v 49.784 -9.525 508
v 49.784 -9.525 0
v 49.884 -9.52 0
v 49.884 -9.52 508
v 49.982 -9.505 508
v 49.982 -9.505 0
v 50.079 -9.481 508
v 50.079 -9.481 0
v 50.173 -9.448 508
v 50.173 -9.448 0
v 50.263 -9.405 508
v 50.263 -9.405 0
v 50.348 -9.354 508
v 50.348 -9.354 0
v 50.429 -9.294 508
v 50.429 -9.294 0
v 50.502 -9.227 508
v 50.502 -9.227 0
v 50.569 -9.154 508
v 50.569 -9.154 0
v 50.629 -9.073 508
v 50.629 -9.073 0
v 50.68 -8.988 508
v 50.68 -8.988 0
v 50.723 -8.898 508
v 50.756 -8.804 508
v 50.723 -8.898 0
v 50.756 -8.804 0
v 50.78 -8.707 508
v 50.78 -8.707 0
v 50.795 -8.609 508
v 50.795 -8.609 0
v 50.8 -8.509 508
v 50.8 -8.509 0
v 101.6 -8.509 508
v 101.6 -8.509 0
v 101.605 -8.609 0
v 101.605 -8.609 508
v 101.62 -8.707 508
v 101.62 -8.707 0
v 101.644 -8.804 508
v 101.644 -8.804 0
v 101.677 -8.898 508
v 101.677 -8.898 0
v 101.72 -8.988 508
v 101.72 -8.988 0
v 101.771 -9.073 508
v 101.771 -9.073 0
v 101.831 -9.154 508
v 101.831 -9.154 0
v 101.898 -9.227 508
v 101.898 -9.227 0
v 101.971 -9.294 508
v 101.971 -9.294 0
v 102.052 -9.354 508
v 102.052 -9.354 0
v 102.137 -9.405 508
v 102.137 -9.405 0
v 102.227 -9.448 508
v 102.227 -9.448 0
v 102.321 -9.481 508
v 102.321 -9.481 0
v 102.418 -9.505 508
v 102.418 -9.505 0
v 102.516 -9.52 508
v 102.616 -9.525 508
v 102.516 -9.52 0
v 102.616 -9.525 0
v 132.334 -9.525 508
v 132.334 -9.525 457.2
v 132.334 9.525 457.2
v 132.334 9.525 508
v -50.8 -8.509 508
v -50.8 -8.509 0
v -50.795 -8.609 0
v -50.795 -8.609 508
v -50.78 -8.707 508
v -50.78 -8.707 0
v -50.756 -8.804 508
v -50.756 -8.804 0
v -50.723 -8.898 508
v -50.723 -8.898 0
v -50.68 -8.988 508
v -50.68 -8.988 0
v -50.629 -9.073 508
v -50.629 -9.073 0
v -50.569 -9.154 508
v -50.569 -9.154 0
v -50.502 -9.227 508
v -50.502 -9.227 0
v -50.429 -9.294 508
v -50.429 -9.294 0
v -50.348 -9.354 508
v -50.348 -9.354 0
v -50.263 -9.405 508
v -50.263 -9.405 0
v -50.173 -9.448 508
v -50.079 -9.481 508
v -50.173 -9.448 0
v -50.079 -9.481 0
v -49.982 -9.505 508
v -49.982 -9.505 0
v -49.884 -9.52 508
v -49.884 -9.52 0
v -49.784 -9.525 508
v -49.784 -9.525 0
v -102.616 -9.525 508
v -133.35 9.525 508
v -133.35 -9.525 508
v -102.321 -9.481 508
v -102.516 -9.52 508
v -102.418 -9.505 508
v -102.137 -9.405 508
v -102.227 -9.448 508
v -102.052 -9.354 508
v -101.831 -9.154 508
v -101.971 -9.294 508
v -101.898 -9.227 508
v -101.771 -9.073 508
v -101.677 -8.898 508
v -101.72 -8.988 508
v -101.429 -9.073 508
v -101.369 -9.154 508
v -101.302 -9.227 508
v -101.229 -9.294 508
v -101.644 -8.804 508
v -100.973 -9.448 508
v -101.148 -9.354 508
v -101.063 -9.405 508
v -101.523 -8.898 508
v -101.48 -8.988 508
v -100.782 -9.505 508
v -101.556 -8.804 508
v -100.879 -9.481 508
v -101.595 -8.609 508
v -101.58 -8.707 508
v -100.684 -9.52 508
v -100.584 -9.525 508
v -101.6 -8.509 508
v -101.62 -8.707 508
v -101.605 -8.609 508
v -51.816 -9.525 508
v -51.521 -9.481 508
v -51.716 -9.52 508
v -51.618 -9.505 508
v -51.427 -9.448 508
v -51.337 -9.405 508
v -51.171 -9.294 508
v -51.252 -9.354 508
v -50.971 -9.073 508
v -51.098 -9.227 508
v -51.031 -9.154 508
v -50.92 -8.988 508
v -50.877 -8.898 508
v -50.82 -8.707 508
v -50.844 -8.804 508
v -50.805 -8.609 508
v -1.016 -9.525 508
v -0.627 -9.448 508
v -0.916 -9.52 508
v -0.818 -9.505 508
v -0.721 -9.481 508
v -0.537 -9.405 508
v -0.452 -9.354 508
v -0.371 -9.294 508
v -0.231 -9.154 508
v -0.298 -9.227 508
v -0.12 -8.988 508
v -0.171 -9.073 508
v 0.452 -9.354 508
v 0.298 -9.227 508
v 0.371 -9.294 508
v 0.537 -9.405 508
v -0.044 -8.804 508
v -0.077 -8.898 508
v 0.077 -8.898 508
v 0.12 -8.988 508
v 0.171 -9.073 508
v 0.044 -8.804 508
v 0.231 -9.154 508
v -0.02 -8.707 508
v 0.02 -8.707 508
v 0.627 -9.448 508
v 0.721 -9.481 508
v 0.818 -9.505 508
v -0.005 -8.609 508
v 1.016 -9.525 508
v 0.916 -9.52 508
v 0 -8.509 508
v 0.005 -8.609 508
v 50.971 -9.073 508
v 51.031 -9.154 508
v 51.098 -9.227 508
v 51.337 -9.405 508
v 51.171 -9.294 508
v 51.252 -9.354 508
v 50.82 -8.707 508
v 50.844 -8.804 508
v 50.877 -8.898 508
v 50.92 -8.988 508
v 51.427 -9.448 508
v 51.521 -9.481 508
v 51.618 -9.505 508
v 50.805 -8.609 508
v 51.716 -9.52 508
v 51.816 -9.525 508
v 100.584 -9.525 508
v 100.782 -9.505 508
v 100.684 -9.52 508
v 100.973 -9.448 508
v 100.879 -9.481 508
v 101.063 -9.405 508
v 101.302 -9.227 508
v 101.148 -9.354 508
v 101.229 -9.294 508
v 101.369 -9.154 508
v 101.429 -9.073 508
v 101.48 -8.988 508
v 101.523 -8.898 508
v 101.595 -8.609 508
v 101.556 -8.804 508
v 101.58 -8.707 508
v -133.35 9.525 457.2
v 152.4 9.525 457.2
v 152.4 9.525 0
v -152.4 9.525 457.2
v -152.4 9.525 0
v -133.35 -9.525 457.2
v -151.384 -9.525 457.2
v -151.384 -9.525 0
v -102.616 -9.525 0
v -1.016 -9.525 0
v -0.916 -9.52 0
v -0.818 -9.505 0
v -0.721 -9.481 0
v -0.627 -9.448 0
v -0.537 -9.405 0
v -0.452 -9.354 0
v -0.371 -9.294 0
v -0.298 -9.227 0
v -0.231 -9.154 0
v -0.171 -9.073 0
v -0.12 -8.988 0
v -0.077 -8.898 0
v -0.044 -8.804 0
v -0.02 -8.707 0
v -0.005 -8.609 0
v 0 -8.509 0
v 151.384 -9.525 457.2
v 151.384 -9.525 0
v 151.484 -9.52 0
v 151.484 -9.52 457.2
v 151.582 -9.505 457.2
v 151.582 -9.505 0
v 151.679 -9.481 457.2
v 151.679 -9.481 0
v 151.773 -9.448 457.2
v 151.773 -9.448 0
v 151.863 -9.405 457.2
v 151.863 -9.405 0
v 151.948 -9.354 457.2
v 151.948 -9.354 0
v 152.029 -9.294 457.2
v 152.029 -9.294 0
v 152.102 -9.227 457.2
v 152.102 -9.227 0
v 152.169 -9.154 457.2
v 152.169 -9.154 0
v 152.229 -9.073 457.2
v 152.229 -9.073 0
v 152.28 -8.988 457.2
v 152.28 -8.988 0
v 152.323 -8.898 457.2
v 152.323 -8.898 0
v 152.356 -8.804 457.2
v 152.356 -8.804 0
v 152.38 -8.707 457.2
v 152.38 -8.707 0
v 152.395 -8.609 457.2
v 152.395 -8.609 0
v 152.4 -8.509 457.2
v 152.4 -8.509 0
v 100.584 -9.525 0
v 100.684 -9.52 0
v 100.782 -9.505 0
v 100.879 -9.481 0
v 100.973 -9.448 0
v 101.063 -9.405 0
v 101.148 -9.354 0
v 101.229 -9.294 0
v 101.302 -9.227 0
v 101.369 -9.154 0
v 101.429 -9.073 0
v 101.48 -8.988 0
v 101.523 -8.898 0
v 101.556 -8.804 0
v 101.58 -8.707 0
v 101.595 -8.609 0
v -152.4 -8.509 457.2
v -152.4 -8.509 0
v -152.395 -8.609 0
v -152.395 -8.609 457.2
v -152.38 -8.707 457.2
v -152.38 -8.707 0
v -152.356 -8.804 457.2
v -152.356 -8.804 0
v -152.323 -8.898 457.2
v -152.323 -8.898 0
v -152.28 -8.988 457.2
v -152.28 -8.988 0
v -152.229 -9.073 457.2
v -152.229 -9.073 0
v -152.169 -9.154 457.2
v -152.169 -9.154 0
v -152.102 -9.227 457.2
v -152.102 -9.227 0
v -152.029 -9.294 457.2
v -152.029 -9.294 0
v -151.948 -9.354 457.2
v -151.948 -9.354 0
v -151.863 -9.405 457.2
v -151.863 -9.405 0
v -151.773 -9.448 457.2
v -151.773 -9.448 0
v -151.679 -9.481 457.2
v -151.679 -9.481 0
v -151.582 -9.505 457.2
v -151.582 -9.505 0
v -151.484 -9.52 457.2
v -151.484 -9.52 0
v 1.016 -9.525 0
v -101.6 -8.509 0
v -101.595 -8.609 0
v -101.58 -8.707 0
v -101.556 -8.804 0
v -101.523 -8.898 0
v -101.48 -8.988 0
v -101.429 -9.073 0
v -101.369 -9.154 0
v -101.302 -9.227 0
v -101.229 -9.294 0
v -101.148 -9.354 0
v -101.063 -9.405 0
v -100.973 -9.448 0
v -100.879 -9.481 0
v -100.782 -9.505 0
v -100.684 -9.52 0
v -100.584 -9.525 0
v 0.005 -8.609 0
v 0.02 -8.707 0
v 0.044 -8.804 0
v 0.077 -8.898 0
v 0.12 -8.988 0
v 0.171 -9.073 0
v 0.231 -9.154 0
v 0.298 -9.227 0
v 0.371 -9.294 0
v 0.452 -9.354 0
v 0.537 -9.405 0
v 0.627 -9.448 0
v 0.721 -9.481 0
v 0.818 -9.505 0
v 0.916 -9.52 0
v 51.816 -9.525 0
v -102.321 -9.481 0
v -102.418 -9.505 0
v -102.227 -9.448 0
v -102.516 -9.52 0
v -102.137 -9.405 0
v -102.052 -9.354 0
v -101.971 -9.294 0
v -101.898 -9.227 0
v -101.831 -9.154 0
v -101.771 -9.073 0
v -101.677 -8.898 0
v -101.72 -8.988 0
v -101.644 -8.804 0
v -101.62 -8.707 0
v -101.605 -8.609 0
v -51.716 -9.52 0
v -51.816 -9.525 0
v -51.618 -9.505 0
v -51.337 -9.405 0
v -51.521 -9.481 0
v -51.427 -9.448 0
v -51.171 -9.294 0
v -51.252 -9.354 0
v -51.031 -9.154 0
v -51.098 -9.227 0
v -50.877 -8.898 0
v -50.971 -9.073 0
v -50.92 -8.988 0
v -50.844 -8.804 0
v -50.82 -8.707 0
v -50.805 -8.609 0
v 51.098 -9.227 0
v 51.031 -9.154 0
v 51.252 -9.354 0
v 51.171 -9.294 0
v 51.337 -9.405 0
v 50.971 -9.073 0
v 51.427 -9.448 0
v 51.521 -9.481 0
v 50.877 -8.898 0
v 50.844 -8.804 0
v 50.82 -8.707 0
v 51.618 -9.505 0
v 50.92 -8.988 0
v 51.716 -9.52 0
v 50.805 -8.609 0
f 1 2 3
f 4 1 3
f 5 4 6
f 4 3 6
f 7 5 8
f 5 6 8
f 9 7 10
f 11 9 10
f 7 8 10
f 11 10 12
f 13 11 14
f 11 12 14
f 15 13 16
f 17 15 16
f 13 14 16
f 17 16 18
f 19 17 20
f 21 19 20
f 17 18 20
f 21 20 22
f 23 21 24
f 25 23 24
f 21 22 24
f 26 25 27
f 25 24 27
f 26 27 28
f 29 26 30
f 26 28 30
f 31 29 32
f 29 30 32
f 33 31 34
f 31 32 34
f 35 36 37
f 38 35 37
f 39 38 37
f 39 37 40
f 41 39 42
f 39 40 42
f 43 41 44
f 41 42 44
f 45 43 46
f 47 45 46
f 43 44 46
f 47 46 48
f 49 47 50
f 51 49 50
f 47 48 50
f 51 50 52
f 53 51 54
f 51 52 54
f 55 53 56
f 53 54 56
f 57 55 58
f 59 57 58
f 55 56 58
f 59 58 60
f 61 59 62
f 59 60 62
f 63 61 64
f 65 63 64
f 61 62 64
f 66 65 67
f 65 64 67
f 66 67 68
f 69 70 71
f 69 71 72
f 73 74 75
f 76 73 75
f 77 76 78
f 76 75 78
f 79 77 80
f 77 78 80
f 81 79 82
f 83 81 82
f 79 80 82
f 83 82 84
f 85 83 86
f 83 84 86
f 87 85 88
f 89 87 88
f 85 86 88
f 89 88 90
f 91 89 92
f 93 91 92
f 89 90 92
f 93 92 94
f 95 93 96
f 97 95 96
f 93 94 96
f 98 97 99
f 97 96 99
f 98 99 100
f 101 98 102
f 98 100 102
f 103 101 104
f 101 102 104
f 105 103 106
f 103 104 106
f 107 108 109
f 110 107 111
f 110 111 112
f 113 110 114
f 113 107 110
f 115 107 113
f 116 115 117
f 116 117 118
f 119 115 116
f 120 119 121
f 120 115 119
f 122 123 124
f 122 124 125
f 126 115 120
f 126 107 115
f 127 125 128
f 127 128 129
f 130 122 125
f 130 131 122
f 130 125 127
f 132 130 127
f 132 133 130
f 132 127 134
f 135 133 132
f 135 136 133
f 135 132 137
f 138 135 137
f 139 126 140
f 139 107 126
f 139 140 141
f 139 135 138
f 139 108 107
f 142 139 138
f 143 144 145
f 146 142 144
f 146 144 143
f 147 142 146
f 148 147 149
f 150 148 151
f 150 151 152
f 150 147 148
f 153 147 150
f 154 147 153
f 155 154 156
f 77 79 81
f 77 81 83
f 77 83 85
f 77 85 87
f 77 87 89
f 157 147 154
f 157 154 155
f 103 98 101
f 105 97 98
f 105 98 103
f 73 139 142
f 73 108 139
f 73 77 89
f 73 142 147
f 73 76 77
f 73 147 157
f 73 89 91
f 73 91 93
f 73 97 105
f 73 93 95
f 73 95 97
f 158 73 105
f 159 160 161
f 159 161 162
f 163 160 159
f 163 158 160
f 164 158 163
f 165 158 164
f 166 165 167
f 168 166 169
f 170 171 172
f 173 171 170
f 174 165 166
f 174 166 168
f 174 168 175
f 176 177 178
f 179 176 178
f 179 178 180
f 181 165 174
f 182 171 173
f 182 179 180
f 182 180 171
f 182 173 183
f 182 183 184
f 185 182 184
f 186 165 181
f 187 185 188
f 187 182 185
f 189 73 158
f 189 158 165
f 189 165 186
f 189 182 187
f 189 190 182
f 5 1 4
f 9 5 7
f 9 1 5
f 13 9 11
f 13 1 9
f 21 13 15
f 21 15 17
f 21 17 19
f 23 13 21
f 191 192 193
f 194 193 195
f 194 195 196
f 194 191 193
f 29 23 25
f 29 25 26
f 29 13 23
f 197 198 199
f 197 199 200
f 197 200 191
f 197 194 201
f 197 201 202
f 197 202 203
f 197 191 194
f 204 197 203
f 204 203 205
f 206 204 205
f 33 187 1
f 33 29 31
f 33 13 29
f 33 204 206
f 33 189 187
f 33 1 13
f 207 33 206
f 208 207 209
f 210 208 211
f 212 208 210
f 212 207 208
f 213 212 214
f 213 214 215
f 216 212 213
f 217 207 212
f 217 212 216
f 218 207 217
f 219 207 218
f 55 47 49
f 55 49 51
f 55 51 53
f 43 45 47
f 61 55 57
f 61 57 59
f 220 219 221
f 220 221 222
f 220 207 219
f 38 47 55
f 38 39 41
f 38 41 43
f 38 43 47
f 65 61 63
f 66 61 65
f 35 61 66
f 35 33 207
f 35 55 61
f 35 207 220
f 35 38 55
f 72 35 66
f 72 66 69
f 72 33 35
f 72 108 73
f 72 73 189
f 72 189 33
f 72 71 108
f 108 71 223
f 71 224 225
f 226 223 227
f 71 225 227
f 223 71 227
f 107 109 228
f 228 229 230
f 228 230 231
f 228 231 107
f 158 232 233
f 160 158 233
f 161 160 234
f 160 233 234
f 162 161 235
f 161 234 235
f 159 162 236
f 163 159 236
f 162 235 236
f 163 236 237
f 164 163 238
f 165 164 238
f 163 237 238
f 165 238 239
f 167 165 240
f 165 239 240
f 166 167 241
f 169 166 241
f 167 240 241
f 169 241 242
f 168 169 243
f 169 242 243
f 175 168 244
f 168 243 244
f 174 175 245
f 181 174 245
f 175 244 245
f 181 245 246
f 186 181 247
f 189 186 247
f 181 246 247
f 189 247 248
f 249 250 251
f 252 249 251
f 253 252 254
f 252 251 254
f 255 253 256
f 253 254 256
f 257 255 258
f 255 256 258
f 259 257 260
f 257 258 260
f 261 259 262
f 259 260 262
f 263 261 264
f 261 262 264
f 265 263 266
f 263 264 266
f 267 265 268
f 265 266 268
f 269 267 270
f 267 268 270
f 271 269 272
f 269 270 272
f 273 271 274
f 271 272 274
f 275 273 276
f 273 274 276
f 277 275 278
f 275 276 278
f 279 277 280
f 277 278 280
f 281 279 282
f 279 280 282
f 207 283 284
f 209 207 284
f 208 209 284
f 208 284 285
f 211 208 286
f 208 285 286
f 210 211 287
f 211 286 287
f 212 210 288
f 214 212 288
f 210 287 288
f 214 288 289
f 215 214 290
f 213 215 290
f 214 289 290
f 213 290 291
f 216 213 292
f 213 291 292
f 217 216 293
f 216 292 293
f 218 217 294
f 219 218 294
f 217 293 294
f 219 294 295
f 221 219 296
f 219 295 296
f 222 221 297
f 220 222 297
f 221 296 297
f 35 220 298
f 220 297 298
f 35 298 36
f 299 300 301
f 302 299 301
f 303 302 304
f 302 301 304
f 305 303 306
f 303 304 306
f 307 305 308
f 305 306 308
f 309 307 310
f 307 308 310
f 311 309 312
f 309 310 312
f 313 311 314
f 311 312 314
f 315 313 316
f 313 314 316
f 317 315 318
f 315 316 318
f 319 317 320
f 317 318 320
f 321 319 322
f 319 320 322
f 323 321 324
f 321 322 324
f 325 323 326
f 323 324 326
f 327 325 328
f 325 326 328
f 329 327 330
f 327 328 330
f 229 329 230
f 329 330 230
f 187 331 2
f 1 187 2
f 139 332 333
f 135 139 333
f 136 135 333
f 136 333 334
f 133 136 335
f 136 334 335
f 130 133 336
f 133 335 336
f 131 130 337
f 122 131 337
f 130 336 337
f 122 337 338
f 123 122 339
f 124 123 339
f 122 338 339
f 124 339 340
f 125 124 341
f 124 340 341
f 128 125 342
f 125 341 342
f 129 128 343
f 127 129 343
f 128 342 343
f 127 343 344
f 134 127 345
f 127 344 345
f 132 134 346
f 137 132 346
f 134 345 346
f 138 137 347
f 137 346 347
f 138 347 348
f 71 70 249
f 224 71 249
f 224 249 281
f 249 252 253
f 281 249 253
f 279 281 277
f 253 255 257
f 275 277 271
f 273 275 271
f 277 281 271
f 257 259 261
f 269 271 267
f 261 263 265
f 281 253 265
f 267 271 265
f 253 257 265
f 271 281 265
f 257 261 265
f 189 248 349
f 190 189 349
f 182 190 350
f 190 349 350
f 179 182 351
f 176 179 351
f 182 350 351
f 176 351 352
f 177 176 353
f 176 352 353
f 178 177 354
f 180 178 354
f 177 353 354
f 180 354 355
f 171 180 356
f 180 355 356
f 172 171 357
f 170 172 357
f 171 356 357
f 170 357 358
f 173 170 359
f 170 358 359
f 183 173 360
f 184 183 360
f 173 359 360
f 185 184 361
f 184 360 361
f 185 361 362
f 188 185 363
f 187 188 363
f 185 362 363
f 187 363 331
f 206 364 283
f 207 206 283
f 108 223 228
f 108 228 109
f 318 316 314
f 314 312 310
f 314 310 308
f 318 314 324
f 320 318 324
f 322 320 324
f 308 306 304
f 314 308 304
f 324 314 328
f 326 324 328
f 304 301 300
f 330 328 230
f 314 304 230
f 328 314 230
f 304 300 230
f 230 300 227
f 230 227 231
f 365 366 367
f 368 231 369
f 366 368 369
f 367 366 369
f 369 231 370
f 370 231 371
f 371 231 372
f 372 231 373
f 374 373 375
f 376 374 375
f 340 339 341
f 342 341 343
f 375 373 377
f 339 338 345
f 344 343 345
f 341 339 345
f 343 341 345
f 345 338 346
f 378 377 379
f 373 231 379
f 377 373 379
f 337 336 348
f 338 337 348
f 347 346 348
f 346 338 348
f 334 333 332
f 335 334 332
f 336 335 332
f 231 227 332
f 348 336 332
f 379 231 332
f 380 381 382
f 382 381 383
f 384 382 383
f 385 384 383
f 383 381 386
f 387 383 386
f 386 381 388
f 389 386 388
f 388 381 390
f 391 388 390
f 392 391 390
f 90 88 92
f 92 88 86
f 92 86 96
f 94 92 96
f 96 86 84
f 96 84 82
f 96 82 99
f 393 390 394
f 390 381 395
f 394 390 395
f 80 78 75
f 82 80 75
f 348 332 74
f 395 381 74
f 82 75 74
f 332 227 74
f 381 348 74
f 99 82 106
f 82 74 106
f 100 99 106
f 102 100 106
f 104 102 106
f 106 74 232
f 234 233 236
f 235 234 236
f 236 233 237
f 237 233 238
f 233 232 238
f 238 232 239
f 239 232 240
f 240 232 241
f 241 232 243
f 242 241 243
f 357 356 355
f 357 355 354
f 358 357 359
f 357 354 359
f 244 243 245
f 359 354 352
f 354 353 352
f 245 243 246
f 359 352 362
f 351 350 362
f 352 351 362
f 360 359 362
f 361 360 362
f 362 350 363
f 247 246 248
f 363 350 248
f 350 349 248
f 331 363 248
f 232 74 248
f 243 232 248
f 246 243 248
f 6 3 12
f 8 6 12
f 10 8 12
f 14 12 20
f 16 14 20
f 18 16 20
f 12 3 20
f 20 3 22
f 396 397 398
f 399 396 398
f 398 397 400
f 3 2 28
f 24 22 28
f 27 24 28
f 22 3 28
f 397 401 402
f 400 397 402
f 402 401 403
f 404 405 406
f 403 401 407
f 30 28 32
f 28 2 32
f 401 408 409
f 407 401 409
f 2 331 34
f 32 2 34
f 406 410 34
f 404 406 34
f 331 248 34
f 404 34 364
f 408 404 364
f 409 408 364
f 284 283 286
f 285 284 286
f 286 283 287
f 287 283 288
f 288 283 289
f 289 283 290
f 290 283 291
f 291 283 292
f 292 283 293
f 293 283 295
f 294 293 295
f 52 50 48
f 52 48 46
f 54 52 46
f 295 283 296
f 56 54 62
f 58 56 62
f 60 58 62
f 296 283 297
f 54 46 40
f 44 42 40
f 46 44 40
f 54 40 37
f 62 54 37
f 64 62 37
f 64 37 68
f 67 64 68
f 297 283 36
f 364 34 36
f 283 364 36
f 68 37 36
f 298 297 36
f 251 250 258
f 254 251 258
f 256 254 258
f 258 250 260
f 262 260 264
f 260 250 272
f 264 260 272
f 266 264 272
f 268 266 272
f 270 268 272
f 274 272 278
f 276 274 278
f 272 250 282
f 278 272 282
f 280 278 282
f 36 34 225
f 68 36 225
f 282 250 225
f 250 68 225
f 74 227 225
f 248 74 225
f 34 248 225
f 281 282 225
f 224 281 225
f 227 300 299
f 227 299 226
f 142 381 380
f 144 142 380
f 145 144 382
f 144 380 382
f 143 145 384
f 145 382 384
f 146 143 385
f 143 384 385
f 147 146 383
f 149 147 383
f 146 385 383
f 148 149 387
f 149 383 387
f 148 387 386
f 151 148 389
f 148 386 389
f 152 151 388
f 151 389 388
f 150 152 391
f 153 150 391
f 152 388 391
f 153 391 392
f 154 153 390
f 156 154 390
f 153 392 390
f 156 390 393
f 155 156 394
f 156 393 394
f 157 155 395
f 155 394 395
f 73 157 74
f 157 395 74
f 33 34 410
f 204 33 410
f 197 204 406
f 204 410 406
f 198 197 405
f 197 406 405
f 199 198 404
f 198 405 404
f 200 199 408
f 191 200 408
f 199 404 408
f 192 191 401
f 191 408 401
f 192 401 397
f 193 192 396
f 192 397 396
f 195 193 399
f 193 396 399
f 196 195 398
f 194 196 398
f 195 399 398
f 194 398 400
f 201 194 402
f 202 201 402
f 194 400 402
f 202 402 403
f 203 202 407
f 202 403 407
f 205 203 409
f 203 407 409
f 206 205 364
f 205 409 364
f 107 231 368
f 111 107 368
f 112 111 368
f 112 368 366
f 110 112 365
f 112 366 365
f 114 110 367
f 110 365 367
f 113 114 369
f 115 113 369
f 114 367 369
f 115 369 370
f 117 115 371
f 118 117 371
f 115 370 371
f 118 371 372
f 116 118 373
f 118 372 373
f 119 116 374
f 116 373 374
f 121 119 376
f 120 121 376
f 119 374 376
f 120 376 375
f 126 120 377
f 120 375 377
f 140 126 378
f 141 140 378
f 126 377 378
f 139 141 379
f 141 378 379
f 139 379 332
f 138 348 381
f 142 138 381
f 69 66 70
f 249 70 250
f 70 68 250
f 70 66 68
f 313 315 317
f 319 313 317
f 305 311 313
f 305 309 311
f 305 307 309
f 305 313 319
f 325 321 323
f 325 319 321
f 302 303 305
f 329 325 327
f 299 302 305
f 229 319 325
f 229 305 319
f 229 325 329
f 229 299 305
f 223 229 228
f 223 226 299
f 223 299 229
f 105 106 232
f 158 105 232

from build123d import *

# Parameters (mm, degrees)
F1_DEPTH = 508
F2_W     = 381
F2_H     = 81.164872
F2_H_2   = 93.253256
F3_DEPTH = 508
F4_W     = 105.076212
F4_H     = 105.076222
F4_W_2   = 127
F4_H_2   = 101.6
F5_DEPTH = 12.7


with BuildPart() as f1:
    # F0 (on Top) → F1 (new body)
    with BuildSketch(Plane.XY):
        with BuildLine():
            Line((458.216, -9.525), (533.4, -9.525))
            Line((533.4, -9.525), (533.4, 9.525))
            Line((533.4, 9.525), (-533.4, 9.525))
            Line((-533.4, 9.525), (-533.4, -9.525))
            Line((-533.4, -9.525), (-509.016, -9.525))
            ThreePointArc((-509.016, -9.525), (-508.29758, -9.22742), (-508, -8.509))
            ThreePointArc((-508, -8.509), (-507.70242, -9.22742), (-506.984, -9.525))
            Line((-506.984, -9.525), (-458.216, -9.525))
            ThreePointArc((-458.216, -9.525), (-457.49758, -9.22742), (-457.2, -8.509))
            ThreePointArc((-457.2, -8.509), (-456.90242, -9.22742), (-456.184, -9.525))
            Line((-456.184, -9.525), (-407.416, -9.525))
            ThreePointArc((-407.416, -9.525), (-406.69758, -9.22742), (-406.4, -8.509))
            ThreePointArc((-406.4, -8.509), (-406.10242, -9.22742), (-405.384, -9.525))
            Line((-405.384, -9.525), (-356.616, -9.525))
            ThreePointArc((-356.616, -9.525), (-355.89758, -9.22742), (-355.6, -8.509))
            ThreePointArc((-355.6, -8.509), (-355.30242, -9.22742), (-354.584, -9.525))
            Line((-354.584, -9.525), (-305.816, -9.525))
            ThreePointArc((-305.816, -9.525), (-305.09758, -9.22742), (-304.8, -8.509))
            ThreePointArc((-304.8, -8.509), (-304.50242, -9.22742), (-303.784, -9.525))
            Line((-303.784, -9.525), (-255.016, -9.525))
            ThreePointArc((-255.016, -9.525), (-254.29758, -9.22742), (-254, -8.509))
            ThreePointArc((-254, -8.509), (-253.70242, -9.22742), (-252.984, -9.525))
            Line((-252.984, -9.525), (-204.216, -9.525))
            ThreePointArc((-204.216, -9.525), (-203.49758, -9.22742), (-203.2, -8.509))
            ThreePointArc((-203.2, -8.509), (-202.90242, -9.22742), (-202.184, -9.525))
            Line((-202.184, -9.525), (-153.416, -9.525))
            ThreePointArc((-153.416, -9.525), (-152.69758, -9.22742), (-152.4, -8.509))
            ThreePointArc((-152.4, -8.509), (-152.10242, -9.22742), (-151.384, -9.525))
            Line((-151.384, -9.525), (-102.616, -9.525))
            ThreePointArc((-102.616, -9.525), (-101.89758, -9.22742), (-101.6, -8.509))
            ThreePointArc((-101.6, -8.509), (-101.30242, -9.22742), (-100.584, -9.525))
            Line((-100.584, -9.525), (-51.816, -9.525))
            ThreePointArc((-51.816, -9.525), (-51.09758, -9.22742), (-50.8, -8.509))
            ThreePointArc((-50.8, -8.509), (-50.50242, -9.22742), (-49.784, -9.525))
            Line((-49.784, -9.525), (-1.016, -9.525))
            ThreePointArc((-1.016, -9.525), (-0.29758, -9.22742), (0, -8.509))
            ThreePointArc((0, -8.509), (0.29758, -9.22742), (1.016, -9.525))
            Line((1.016, -9.525), (49.784, -9.525))
            ThreePointArc((49.784, -9.525), (50.50242, -9.22742), (50.8, -8.509))
            ThreePointArc((50.8, -8.509), (51.09758, -9.22742), (51.816, -9.525))
            Line((51.816, -9.525), (100.584, -9.525))
            ThreePointArc((100.584, -9.525), (101.30242, -9.22742), (101.6, -8.509))
            ThreePointArc((101.6, -8.509), (101.89758, -9.22742), (102.616, -9.525))
            Line((102.616, -9.525), (151.384, -9.525))
            ThreePointArc((151.384, -9.525), (152.10242, -9.22742), (152.4, -8.509))
            ThreePointArc((152.4, -8.509), (152.69758, -9.22742), (153.416, -9.525))
            Line((153.416, -9.525), (202.184, -9.525))
            ThreePointArc((202.184, -9.525), (202.90242, -9.22742), (203.2, -8.509))
            ThreePointArc((203.2, -8.509), (203.49758, -9.22742), (204.216, -9.525))
            Line((204.216, -9.525), (252.984, -9.525))
            ThreePointArc((252.984, -9.525), (253.70242, -9.22742), (254, -8.509))
            ThreePointArc((254, -8.509), (254.29758, -9.22742), (255.016, -9.525))
            Line((255.016, -9.525), (303.784, -9.525))
            ThreePointArc((303.784, -9.525), (304.50242, -9.22742), (304.8, -8.509))
            ThreePointArc((304.8, -8.509), (305.09758, -9.22742), (305.816, -9.525))
            Line((305.816, -9.525), (354.584, -9.525))
            ThreePointArc((354.584, -9.525), (355.30242, -9.22742), (355.6, -8.509))
            ThreePointArc((355.6, -8.509), (355.89758, -9.22742), (356.616, -9.525))
            Line((356.616, -9.525), (405.384, -9.525))
            ThreePointArc((405.384, -9.525), (406.10242, -9.22742), (406.4, -8.509))
            ThreePointArc((406.4, -8.509), (406.69758, -9.22742), (407.416, -9.525))
            Line((407.416, -9.525), (456.184, -9.525))
            ThreePointArc((456.184, -9.525), (456.90242, -9.22742), (457.2, -8.509))
            ThreePointArc((457.2, -8.509), (457.49758, -9.22742), (458.216, -9.525))
        make_face()
        with BuildLine():
            ThreePointArc((-508, -8.509), (-508.29758, -9.22742), (-509.016, -9.525))
            Line((-509.016, -9.525), (-506.984, -9.525))
            ThreePointArc((-506.984, -9.525), (-507.70242, -9.22742), (-508, -8.509))
        make_face()
    extrude(amount=F1_DEPTH)

    # F2 (on Top) → F3 (cut)
    with BuildSketch(Plane.XY):
        with Locations((-342.9, -9.482393)):
            Rectangle(F2_W, F2_H)
        with Locations((342.9, -12.072761)):
            Rectangle(F2_W, F2_H_2)
    extrude(amount=F3_DEPTH, mode=Mode.SUBTRACT)

    # F4 (on Front) → F5 (cut, symmetric)
    with BuildSketch(Plane.XZ):
        with Locations((-185.888106, 509.738111)):
            Rectangle(F4_W, F4_H)
        with Locations((195.834, 508)):
            Rectangle(F4_W_2, F4_H_2)
    extrude(amount=F5_DEPTH, both=True, mode=Mode.SUBTRACT)


solid = f1.part
